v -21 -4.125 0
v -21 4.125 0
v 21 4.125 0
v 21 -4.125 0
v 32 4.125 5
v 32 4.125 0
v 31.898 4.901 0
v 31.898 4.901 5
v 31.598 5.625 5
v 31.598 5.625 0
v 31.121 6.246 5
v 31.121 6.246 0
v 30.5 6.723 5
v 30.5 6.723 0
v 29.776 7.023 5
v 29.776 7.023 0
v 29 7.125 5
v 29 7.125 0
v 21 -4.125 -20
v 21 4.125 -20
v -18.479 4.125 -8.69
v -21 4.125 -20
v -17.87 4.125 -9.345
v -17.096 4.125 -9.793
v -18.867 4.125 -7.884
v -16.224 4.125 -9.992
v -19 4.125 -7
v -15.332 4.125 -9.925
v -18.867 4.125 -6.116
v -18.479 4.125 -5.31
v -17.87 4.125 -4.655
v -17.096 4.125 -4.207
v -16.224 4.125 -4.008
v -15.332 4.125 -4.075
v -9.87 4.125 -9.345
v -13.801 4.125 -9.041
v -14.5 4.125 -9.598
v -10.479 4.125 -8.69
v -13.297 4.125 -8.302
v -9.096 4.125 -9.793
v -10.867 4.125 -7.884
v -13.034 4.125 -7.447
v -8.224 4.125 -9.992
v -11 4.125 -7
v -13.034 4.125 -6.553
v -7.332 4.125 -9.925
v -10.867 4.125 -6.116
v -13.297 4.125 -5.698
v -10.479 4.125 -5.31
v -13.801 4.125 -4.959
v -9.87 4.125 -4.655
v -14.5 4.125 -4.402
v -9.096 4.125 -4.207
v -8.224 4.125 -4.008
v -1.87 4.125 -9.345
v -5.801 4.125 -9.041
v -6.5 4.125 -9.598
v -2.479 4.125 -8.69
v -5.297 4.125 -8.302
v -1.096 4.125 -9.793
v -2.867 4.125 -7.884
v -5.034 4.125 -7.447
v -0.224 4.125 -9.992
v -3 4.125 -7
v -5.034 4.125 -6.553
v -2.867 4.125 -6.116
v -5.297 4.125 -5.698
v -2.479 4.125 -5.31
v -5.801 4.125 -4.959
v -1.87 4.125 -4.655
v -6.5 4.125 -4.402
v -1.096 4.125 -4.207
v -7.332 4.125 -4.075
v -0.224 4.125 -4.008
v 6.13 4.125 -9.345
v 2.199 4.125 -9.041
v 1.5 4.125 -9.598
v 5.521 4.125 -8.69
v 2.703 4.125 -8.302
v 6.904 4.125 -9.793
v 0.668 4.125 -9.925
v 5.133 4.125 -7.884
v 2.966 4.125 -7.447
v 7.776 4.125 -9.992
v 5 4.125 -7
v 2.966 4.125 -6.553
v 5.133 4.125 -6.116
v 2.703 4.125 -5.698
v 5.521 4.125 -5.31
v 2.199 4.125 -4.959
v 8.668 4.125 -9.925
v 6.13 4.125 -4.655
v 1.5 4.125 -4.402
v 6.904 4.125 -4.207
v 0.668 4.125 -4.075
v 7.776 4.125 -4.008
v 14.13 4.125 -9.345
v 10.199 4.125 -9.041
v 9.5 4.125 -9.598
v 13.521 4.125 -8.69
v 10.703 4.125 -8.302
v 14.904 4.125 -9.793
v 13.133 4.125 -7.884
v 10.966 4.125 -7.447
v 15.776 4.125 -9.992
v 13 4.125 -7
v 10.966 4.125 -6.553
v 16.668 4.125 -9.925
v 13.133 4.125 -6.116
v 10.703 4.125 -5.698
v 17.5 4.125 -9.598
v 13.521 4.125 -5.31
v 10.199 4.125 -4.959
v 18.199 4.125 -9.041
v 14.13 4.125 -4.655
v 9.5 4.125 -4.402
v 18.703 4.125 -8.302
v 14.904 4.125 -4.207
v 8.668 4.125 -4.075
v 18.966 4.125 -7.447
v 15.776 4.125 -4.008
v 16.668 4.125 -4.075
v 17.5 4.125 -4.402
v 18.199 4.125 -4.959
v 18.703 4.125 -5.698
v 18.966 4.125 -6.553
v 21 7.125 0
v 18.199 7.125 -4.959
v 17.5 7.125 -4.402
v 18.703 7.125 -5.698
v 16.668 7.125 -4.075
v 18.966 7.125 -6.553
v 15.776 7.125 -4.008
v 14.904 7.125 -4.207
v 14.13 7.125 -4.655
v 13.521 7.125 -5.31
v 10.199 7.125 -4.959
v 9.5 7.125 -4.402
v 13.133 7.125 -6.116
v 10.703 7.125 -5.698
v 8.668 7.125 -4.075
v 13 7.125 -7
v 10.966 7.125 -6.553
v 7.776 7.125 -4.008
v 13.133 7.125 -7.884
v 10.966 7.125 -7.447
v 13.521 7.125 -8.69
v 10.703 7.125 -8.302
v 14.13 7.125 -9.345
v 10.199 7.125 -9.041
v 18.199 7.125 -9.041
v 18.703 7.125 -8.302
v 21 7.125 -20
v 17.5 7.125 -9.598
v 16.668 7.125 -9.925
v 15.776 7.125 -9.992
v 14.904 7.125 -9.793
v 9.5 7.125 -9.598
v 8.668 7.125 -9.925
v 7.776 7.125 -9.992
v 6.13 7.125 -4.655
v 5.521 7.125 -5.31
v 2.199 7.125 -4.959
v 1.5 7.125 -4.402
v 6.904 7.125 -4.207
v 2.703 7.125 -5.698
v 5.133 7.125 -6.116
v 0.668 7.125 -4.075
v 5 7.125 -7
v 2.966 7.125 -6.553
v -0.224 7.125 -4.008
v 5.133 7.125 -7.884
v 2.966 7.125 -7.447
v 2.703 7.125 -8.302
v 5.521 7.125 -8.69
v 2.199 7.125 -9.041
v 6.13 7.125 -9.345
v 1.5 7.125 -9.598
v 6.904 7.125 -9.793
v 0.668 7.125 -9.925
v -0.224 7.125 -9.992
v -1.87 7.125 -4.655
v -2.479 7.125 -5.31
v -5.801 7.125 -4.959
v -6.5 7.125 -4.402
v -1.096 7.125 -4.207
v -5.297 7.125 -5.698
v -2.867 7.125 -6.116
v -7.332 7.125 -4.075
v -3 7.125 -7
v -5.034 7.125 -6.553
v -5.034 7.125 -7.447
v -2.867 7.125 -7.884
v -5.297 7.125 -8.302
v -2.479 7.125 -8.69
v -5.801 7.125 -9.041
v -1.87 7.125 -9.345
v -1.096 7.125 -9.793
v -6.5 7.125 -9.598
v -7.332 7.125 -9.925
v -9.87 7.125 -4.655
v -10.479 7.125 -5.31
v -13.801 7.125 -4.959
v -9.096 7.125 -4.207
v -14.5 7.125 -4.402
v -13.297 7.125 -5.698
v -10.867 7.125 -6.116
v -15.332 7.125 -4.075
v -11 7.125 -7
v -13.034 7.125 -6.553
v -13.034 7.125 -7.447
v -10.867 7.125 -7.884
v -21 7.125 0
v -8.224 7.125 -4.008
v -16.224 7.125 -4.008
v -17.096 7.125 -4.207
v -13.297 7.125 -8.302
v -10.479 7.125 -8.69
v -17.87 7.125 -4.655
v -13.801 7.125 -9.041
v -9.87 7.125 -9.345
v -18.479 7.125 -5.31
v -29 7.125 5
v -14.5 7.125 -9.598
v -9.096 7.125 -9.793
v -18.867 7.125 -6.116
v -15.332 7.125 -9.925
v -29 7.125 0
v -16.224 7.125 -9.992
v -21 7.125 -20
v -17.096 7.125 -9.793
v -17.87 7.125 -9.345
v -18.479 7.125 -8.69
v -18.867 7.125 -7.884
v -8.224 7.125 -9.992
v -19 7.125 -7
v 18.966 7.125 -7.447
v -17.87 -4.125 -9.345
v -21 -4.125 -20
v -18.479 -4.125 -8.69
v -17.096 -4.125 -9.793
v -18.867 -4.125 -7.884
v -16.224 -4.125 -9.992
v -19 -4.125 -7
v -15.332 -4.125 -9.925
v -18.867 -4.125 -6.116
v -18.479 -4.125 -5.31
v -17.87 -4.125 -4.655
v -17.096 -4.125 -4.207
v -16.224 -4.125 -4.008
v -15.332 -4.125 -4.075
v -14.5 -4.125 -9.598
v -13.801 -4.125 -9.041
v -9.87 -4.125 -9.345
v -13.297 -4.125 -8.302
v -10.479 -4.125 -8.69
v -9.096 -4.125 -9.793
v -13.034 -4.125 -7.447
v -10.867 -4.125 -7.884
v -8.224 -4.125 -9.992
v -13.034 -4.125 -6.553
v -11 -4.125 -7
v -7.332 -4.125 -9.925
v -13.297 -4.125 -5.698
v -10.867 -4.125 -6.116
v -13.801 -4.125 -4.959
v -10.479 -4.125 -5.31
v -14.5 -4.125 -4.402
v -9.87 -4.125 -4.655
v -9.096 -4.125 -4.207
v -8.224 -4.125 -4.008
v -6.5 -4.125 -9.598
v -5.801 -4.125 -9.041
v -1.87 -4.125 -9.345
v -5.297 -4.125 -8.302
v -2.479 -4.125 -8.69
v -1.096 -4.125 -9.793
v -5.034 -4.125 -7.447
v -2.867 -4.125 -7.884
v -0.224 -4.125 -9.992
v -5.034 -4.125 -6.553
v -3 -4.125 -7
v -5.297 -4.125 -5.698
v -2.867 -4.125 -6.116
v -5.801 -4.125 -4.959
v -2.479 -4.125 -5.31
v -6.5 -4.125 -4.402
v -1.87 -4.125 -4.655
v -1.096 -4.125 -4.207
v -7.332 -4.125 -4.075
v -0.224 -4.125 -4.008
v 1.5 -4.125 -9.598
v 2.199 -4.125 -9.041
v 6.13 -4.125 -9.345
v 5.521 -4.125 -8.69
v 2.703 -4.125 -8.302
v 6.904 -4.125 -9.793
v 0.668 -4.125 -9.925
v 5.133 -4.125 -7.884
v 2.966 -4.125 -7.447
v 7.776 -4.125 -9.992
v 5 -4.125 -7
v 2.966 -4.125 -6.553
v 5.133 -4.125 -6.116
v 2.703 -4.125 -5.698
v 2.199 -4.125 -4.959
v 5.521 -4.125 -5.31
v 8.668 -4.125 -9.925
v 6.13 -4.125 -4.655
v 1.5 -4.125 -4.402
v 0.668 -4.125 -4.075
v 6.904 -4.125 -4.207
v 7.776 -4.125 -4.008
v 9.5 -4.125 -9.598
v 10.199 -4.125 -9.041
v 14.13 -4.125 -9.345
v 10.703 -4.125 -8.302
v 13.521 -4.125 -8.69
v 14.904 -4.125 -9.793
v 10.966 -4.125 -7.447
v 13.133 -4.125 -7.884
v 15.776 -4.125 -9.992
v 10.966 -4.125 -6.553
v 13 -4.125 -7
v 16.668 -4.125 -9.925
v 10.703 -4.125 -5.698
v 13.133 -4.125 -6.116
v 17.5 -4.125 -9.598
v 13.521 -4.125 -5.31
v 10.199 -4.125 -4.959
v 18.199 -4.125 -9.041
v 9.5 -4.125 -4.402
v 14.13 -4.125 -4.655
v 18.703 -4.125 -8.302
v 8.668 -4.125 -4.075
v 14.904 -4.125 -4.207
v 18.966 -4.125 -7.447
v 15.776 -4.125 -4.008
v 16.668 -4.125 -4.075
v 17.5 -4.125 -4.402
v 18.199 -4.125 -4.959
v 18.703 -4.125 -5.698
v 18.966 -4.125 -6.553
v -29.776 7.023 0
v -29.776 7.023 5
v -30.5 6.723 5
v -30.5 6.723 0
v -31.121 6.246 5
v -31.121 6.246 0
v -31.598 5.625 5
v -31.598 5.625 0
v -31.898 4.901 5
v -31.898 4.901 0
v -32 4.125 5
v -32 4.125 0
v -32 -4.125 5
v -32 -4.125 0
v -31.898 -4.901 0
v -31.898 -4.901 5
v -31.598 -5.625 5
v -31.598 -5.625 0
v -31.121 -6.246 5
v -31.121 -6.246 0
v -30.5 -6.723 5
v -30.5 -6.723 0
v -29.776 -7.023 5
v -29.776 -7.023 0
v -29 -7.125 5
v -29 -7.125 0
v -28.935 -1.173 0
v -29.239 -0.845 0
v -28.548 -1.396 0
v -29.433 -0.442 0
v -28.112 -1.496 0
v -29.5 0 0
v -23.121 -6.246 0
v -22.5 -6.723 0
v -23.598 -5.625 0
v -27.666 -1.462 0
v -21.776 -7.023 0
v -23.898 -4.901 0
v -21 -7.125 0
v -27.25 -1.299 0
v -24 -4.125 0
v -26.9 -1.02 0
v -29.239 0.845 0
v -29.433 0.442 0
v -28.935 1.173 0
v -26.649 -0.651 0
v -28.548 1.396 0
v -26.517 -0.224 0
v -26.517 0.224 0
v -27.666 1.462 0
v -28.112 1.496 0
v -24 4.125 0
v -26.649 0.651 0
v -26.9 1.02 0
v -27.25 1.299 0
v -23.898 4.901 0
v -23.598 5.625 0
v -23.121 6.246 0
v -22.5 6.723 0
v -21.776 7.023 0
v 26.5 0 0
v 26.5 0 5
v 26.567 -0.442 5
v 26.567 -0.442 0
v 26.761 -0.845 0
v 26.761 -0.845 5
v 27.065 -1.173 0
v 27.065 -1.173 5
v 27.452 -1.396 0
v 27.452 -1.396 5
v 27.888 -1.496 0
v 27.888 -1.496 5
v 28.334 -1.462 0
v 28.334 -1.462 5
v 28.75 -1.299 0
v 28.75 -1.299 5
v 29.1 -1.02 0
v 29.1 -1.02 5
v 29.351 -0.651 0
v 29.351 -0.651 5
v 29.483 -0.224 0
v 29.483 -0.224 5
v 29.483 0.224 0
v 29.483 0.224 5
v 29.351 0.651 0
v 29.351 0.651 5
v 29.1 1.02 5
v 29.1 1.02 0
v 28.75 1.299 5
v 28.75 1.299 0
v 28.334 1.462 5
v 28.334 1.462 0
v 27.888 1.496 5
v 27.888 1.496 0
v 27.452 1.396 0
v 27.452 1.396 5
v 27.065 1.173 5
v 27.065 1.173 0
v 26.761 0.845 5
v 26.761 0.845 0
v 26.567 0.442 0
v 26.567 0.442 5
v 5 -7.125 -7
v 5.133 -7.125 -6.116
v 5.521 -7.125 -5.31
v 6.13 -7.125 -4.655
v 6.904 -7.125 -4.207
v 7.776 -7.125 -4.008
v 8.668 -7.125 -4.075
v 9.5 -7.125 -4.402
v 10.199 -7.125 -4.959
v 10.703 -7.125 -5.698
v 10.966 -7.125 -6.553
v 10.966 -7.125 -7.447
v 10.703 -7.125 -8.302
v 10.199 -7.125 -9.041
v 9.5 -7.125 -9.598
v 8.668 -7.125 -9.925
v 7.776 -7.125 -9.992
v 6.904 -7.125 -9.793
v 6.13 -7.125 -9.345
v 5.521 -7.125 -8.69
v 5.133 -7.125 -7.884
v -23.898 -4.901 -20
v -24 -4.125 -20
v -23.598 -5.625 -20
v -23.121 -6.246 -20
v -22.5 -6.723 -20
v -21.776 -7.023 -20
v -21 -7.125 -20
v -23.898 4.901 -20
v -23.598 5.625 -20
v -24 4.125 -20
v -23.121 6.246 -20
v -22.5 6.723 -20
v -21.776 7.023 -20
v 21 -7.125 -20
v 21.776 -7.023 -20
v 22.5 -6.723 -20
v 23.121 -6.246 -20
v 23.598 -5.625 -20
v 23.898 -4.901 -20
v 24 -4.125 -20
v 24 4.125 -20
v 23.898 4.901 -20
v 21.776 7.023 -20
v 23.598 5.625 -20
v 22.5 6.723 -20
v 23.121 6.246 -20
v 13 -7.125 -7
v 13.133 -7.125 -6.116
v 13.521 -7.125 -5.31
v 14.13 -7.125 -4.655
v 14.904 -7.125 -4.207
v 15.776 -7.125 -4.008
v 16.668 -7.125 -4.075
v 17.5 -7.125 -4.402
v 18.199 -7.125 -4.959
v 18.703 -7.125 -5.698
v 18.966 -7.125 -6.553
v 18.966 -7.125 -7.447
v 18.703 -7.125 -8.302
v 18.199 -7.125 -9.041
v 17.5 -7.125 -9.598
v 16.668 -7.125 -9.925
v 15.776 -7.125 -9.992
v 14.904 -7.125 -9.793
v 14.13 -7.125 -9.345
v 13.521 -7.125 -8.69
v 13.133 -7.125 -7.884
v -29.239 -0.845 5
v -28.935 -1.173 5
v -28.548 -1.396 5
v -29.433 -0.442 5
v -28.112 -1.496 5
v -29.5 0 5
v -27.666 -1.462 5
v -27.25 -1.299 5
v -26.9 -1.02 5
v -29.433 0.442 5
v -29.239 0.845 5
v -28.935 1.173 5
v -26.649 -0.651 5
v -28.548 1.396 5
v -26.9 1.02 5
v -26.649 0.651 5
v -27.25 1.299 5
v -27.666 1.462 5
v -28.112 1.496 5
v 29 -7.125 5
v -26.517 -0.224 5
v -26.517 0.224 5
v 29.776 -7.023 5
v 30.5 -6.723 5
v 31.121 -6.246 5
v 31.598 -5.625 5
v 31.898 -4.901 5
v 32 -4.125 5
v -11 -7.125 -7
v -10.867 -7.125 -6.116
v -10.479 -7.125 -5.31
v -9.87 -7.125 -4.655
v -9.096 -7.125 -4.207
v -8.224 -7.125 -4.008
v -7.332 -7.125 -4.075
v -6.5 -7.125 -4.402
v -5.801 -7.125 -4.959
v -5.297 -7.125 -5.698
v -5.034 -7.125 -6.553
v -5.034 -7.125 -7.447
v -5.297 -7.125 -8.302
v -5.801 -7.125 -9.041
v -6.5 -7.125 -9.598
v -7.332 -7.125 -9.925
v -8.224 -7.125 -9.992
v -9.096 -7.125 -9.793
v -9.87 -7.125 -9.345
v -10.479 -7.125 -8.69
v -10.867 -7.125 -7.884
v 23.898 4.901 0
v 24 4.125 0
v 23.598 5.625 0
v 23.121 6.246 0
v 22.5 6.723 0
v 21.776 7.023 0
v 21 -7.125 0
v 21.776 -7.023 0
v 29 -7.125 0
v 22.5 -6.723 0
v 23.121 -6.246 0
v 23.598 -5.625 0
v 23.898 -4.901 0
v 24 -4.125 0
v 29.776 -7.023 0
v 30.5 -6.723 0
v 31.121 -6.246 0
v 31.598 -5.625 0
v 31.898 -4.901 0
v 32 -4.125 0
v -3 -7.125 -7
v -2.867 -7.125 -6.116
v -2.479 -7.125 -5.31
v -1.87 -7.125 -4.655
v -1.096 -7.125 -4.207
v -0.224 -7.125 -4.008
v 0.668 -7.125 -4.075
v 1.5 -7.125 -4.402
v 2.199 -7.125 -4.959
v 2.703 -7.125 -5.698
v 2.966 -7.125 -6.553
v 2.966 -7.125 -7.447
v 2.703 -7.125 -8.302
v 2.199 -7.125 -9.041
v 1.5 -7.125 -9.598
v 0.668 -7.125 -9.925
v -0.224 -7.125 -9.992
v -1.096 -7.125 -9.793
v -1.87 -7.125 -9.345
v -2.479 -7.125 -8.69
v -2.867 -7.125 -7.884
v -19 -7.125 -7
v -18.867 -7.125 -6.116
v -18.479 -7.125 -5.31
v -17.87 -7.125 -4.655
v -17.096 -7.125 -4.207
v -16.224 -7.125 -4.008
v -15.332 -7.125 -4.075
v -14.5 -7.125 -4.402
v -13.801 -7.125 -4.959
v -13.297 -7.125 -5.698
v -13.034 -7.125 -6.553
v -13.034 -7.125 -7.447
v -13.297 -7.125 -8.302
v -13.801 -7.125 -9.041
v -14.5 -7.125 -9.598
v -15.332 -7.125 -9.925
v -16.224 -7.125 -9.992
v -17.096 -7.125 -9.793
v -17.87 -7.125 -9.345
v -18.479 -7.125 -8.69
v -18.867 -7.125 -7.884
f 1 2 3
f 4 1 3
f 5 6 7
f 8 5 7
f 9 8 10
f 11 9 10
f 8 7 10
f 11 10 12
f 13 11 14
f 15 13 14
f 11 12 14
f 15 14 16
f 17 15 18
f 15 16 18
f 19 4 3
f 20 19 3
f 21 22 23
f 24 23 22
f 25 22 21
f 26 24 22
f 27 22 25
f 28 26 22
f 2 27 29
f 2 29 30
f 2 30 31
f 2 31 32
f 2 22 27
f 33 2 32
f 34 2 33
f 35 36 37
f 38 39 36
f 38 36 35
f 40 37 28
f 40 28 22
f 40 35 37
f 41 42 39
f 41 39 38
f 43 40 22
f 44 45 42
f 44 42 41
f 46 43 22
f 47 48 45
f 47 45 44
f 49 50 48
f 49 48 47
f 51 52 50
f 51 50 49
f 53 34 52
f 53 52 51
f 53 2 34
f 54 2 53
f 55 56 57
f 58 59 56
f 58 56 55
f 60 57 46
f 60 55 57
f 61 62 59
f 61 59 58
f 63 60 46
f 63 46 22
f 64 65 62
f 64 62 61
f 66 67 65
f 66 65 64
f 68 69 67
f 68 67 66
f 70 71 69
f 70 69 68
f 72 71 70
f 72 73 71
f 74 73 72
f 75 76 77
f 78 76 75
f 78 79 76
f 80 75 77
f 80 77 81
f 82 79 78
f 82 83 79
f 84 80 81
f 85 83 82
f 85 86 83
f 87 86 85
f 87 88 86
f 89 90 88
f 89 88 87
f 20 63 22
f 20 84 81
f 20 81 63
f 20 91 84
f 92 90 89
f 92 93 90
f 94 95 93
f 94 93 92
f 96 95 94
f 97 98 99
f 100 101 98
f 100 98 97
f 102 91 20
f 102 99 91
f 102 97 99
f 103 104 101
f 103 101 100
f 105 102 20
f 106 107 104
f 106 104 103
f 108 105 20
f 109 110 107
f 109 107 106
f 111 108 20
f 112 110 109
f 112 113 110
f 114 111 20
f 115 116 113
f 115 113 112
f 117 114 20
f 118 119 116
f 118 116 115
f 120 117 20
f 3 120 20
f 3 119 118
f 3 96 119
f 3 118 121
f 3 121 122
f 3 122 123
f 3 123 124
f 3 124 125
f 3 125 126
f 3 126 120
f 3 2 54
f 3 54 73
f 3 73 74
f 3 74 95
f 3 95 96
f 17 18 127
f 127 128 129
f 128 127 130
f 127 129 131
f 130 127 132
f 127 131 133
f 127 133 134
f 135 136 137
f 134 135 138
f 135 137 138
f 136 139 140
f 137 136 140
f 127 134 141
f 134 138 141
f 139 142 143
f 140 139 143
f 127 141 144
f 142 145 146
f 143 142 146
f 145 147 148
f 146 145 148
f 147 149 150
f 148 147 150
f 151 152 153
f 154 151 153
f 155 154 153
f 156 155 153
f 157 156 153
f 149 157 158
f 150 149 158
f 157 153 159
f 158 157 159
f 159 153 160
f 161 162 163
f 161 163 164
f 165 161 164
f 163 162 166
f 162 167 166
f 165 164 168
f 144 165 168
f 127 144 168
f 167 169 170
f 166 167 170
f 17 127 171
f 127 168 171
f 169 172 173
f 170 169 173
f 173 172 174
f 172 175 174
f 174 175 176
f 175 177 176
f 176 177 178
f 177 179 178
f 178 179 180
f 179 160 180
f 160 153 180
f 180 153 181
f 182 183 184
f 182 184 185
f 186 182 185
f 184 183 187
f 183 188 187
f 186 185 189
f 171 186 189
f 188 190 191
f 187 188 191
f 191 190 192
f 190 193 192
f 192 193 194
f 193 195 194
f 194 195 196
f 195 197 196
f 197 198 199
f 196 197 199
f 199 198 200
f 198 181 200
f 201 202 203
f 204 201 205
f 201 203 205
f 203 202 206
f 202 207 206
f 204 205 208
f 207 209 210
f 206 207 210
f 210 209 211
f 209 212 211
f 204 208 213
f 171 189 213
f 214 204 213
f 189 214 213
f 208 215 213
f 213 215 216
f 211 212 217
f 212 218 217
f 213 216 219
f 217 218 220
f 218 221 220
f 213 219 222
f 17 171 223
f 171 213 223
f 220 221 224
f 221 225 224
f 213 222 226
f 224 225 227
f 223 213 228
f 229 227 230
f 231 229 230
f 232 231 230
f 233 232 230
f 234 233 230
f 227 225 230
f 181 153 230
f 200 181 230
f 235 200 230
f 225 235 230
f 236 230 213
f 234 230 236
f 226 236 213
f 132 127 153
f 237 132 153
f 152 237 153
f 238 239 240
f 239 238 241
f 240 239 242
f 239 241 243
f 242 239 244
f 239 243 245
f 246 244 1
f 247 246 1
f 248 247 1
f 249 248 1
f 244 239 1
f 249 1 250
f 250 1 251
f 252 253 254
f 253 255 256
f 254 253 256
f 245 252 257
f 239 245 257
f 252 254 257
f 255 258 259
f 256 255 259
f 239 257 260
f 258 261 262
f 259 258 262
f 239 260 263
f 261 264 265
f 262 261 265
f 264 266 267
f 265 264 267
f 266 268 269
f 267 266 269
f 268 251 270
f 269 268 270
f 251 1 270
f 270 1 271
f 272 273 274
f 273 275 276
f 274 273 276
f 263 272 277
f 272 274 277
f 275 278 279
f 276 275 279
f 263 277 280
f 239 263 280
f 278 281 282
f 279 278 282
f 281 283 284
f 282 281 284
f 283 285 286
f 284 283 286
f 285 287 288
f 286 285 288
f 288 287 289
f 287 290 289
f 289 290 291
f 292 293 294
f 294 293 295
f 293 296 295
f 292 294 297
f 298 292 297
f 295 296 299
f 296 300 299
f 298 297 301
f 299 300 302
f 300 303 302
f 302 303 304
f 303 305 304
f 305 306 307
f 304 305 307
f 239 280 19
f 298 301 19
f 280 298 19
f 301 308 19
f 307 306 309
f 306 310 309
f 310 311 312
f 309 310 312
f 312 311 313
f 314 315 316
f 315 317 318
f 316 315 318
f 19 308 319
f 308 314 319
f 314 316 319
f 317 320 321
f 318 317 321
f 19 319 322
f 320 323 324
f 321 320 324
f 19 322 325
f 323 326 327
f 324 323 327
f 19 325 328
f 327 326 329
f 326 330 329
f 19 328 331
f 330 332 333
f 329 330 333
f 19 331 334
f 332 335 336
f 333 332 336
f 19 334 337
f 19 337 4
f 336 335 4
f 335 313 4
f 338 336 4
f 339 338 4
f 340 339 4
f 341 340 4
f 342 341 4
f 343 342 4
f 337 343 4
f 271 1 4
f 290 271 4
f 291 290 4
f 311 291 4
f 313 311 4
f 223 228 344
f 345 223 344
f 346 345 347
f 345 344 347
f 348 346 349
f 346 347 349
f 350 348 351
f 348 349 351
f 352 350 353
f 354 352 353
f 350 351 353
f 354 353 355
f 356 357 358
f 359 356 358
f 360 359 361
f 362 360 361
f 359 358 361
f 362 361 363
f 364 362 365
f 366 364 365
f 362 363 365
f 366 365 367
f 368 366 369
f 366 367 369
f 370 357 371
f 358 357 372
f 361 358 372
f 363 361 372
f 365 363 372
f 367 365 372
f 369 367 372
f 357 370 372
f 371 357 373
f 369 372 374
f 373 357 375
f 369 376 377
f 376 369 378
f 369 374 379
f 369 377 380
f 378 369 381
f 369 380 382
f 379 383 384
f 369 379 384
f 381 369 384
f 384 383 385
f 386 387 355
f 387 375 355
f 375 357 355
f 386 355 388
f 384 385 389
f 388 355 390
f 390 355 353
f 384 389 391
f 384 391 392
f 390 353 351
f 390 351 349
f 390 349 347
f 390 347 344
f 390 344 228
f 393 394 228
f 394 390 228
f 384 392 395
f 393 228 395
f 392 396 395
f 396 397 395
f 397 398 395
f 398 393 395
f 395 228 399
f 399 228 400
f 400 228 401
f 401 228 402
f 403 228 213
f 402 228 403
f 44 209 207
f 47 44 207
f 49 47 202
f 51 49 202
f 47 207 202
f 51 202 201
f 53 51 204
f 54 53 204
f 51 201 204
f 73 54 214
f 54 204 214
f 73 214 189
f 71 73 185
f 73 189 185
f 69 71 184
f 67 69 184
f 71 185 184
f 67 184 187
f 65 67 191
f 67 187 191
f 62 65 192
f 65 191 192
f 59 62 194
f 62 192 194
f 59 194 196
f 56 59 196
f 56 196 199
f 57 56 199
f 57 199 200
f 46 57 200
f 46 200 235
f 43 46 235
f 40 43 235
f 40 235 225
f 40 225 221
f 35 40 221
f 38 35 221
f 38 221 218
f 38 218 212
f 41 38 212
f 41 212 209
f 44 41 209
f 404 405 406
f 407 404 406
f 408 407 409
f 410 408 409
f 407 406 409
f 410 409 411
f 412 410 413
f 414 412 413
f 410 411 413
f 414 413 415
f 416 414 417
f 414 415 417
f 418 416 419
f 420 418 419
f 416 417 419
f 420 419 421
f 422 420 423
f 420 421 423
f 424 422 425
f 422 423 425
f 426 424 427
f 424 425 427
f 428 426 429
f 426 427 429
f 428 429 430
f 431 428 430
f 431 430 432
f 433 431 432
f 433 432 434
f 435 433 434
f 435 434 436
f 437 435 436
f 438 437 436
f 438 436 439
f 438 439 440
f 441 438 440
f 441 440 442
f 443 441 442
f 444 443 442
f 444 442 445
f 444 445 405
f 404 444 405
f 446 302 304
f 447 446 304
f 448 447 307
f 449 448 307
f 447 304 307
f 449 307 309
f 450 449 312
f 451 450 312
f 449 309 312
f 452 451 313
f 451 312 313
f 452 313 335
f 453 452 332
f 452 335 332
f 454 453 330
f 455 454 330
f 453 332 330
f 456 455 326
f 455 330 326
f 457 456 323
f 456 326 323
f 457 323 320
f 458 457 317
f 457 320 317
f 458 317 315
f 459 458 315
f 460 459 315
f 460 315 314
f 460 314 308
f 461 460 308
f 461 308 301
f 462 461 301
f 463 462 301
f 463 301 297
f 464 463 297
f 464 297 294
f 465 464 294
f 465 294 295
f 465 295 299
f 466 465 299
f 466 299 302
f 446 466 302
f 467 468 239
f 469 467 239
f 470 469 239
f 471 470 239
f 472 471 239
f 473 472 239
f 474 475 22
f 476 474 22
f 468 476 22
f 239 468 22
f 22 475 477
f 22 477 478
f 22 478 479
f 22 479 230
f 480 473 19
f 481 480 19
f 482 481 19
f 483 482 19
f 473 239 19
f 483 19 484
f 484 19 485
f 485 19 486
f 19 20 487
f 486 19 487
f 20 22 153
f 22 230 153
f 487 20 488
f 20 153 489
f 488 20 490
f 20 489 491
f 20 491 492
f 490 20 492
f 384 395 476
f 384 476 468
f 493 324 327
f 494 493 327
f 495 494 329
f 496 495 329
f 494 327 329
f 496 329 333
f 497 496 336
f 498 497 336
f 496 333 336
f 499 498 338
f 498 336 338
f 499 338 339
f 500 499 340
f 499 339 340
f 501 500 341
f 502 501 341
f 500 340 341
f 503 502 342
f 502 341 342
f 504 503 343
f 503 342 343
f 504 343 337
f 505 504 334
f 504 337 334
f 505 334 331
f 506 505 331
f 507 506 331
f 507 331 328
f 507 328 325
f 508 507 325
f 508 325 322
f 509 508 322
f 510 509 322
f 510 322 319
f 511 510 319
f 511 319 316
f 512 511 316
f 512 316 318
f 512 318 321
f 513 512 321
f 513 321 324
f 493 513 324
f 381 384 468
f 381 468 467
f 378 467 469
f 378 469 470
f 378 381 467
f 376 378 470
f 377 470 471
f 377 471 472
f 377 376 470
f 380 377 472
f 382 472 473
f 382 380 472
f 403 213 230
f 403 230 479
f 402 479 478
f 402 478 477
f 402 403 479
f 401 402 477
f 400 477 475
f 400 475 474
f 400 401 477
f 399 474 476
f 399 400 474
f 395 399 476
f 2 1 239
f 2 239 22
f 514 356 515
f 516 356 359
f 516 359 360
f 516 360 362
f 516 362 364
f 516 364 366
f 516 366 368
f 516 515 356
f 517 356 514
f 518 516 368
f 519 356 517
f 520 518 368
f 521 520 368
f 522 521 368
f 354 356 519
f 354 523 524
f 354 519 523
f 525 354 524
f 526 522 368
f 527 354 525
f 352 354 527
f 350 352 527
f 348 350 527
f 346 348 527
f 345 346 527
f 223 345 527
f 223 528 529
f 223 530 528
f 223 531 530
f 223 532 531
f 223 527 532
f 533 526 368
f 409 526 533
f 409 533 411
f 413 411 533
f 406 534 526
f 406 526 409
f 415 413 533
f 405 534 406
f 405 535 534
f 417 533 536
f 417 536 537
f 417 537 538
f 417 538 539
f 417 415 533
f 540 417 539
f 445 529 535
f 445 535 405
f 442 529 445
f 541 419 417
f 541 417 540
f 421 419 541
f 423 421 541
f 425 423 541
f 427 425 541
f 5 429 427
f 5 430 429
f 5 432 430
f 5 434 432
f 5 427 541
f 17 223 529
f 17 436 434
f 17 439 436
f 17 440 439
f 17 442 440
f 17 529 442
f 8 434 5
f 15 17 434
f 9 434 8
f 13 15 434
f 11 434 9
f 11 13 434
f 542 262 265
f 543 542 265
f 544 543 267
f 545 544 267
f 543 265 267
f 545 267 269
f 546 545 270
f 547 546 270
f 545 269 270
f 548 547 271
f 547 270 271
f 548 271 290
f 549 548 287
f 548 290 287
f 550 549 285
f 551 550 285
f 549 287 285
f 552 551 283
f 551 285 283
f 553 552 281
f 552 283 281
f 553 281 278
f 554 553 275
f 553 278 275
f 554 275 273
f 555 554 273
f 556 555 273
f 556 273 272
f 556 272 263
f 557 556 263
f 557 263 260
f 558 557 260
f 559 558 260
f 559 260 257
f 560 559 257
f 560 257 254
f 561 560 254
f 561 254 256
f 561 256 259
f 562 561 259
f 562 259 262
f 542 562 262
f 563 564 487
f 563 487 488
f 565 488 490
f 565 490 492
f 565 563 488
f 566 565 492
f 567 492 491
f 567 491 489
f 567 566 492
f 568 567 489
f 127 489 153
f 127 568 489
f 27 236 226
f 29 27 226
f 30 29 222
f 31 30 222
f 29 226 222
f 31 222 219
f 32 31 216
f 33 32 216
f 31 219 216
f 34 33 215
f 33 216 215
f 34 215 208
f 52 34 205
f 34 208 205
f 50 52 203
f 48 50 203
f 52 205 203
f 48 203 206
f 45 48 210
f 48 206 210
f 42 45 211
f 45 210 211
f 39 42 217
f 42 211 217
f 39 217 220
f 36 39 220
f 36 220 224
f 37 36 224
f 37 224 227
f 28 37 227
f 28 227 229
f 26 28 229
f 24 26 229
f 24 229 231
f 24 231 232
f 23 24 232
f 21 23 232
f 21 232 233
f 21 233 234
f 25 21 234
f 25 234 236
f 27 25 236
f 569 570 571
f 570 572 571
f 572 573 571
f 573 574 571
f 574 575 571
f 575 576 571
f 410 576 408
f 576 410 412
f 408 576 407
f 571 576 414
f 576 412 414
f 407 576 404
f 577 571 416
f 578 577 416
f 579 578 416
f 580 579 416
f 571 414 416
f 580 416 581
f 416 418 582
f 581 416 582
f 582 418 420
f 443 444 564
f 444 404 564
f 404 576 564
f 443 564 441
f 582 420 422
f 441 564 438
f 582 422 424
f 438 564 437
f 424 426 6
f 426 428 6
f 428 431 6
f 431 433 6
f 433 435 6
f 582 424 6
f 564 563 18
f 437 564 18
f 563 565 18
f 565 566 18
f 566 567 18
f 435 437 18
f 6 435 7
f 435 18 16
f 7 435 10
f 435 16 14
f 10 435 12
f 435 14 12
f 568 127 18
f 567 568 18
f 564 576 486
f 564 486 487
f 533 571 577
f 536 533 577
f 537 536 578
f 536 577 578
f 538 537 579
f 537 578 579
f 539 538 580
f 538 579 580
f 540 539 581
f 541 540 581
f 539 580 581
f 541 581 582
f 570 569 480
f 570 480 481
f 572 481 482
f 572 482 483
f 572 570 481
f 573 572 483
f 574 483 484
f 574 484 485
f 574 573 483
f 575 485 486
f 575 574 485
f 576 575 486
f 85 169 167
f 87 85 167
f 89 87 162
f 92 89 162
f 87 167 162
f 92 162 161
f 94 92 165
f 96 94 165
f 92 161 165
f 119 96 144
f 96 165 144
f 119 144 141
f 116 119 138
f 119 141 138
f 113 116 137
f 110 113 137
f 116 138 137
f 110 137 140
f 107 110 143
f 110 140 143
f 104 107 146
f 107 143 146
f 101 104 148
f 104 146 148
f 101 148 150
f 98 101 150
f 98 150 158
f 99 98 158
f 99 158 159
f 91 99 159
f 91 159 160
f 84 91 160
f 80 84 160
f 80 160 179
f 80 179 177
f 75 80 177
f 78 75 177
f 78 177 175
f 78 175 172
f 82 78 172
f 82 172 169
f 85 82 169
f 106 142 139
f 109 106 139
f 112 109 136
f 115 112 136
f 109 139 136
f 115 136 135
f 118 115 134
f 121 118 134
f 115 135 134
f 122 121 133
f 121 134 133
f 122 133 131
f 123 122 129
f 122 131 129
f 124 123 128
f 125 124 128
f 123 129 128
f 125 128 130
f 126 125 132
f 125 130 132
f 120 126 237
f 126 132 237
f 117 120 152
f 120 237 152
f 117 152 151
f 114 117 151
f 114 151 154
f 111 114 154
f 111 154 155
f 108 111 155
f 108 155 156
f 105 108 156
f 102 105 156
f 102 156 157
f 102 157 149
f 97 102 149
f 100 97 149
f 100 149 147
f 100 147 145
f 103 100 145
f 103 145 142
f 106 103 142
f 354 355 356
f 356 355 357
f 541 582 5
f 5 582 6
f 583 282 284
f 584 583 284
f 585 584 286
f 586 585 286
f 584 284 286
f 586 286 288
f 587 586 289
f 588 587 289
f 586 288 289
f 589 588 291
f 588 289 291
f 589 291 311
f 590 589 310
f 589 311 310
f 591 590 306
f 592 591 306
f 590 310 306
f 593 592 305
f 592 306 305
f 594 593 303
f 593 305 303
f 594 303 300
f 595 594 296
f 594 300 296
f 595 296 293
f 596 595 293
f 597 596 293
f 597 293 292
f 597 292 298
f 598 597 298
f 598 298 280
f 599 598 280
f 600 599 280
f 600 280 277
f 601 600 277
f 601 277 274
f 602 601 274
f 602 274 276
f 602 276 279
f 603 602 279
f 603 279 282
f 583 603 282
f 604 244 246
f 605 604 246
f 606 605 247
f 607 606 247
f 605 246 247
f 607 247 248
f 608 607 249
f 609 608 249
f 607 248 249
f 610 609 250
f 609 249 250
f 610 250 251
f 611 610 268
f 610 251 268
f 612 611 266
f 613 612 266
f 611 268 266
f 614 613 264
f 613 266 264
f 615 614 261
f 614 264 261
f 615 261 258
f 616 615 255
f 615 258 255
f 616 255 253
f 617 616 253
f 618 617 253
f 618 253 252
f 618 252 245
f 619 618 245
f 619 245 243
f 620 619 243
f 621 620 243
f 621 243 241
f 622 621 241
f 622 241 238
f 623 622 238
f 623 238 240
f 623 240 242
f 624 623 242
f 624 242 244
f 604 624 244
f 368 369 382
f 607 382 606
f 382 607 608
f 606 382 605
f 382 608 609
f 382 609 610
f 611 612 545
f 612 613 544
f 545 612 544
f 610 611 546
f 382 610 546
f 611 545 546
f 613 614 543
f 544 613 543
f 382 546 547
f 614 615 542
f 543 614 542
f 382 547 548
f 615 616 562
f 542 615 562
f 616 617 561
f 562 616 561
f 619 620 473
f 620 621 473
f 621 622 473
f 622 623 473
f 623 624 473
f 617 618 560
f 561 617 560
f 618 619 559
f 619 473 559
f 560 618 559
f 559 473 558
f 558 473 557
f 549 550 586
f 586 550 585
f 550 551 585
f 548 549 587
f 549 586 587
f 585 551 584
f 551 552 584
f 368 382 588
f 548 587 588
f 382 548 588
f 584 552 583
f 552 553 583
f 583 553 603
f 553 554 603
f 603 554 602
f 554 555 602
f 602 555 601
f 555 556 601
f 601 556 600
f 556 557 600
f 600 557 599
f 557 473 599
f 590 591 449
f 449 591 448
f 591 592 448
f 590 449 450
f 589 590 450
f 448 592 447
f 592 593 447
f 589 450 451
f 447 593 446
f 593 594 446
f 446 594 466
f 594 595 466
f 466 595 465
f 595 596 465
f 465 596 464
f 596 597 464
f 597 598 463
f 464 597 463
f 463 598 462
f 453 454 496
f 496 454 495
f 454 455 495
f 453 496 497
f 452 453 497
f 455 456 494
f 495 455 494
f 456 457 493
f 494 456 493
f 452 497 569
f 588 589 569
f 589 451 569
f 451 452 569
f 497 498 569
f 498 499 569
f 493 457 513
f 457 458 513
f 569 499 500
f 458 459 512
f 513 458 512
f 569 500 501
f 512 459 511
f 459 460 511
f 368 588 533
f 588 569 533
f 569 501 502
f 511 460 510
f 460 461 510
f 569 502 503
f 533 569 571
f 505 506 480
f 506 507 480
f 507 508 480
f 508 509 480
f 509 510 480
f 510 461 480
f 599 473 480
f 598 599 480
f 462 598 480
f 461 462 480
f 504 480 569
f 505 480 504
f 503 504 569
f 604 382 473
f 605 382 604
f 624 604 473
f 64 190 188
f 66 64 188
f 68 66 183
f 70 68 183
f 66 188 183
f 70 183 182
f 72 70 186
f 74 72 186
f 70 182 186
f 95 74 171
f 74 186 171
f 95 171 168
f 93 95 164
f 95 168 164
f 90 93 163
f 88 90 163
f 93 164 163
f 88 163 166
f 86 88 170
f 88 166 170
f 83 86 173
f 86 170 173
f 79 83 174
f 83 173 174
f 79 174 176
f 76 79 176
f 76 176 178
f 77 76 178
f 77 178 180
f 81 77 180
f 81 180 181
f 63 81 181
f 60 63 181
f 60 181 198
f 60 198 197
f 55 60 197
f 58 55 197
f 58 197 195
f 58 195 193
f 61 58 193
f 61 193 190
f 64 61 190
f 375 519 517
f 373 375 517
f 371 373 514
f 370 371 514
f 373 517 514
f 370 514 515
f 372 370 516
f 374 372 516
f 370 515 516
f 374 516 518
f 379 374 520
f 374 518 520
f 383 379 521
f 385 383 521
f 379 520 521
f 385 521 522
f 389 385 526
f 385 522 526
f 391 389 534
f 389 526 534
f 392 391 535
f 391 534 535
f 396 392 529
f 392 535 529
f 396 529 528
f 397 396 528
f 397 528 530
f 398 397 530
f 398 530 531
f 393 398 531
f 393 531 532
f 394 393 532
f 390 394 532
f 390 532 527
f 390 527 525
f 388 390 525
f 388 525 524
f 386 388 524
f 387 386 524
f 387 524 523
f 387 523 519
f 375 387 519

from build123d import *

# Parameters (mm, degrees)
F0_W     = 42
F0_H     = 8.25
F1_DEPTH = 5
F2_DEPTH = 20
F3_R     = 3
F4_DEPTH = 25
F5_D     = 3


with BuildPart() as f1:
    # F0 (on Top) → F1 (new body)
    with BuildSketch(Plane.XY):
        with BuildLine():
            ThreePointArc((-24, 4.125), (-23.12132, 6.24632), (-21, 7.125))
            Line((-21, 7.125), (-29, 7.125))
            ThreePointArc((-29, 7.125), (-31.12132, 6.24632), (-32, 4.125))
            Line((-32, 4.125), (-32, -4.125))
            ThreePointArc((-32, -4.125), (-31.12132, -6.24632), (-29, -7.125))
            Line((-29, -7.125), (-21, -7.125))
            ThreePointArc((-21, -7.125), (-23.12132, -6.24632), (-24, -4.125))
            Line((-24, -4.125), (-24, 4.125))
        make_face()
        with BuildLine():
            ThreePointArc((24, 4.125), (23.12132, 6.24632), (21, 7.125))
            Line((21, 7.125), (-21, 7.125))
            ThreePointArc((-21, 7.125), (-23.12132, 6.24632), (-24, 4.125))
            Line((-24, 4.125), (-24, -4.125))
            ThreePointArc((-24, -4.125), (-23.12132, -6.24632), (-21, -7.125))
            Line((-21, -7.125), (21, -7.125))
            ThreePointArc((21, -7.125), (23.12132, -6.24632), (24, -4.125))
            Line((24, -4.125), (24, 4.125))
        make_face()
        Rectangle(F0_W, F0_H, mode=Mode.SUBTRACT)
        with BuildLine():
            Line((29, 7.125), (21, 7.125))
            ThreePointArc((21, 7.125), (23.12132, 6.24632), (24, 4.125))
            Line((24, 4.125), (24, -4.125))
            ThreePointArc((24, -4.125), (23.12132, -6.24632), (21, -7.125))
            Line((21, -7.125), (29, -7.125))
            ThreePointArc((29, -7.125), (31.12132, -6.24632), (32, -4.125))
            Line((32, -4.125), (32, 4.125))
            ThreePointArc((32, 4.125), (31.12132, 6.24632), (29, 7.125))
        make_face()
        Rectangle(F0_W, F0_H)
    extrude(amount=F1_DEPTH)

    # F0 (on Top) → F2 (join)
    with BuildSketch(Plane.XY):
        with BuildLine():
            ThreePointArc((24, 4.125), (23.12132, 6.24632), (21, 7.125))
            Line((21, 7.125), (-21, 7.125))
            ThreePointArc((-21, 7.125), (-23.12132, 6.24632), (-24, 4.125))
            Line((-24, 4.125), (-24, -4.125))
            ThreePointArc((-24, -4.125), (-23.12132, -6.24632), (-21, -7.125))
            Line((-21, -7.125), (21, -7.125))
            ThreePointArc((21, -7.125), (23.12132, -6.24632), (24, -4.125))
            Line((24, -4.125), (24, 4.125))
        make_face()
        Rectangle(F0_W, F0_H, mode=Mode.SUBTRACT)
    extrude(amount=-F2_DEPTH)

    # F3 (on face) → F4 (cut)
    with BuildSketch(Plane(origin=(0, 7.125, 0), x_dir=(-1, 0, 0), z_dir=(0, 1, 0))):
        with Locations((-16, -7)):
            Circle(F3_R)
        with Locations((-8, -7)):
            Circle(F3_R)
        with Locations((0, -7)):
            Circle(F3_R)
        with Locations((8, -7)):
            Circle(F3_R)
        with Locations((16, -7)):
            Circle(F3_R)
    extrude(amount=-F4_DEPTH, mode=Mode.SUBTRACT)

    # F5 (through all)
    with Locations(Plane(origin=(0, 0, 0), x_dir=(1, 0, 0), z_dir=(0, 0, -1))):
        with Locations((28, 0), (-28, 0)):
            Hole(F5_D / 2)


solid = f1.part
